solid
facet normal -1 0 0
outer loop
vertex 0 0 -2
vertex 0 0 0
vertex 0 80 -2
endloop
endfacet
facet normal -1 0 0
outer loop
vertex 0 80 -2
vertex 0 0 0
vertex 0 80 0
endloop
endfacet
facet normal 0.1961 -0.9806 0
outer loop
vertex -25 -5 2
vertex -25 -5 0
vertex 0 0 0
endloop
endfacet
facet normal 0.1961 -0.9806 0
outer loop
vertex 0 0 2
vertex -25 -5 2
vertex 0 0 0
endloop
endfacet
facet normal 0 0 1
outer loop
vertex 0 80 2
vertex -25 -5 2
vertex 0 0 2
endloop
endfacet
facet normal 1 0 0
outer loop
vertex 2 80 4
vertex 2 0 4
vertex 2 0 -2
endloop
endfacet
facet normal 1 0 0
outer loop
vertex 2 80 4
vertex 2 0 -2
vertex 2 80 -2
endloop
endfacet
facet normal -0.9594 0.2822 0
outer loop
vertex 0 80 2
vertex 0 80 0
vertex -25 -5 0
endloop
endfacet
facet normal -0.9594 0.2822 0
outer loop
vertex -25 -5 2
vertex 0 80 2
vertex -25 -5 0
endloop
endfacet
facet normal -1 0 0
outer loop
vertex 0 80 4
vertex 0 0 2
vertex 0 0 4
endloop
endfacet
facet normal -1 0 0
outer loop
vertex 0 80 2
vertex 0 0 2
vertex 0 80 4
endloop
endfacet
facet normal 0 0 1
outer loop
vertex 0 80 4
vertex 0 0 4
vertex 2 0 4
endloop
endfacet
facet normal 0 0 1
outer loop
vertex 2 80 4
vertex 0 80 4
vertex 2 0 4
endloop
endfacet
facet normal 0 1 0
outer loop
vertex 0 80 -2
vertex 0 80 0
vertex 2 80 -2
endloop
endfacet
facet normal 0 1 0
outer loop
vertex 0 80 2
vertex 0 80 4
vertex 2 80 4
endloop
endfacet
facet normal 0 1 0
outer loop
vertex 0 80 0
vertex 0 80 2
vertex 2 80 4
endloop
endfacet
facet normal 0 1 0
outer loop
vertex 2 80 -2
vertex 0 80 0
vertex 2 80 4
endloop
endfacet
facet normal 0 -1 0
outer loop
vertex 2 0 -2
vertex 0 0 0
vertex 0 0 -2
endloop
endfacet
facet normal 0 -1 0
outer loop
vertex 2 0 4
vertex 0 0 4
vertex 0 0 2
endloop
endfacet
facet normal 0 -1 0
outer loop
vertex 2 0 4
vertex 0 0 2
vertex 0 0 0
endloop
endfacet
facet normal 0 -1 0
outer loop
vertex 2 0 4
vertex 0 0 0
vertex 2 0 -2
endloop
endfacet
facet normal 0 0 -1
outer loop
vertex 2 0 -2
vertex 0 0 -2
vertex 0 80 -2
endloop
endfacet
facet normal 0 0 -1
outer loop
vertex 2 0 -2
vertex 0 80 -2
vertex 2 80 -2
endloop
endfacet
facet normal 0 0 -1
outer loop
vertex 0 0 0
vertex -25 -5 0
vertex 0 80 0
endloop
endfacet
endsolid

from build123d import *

# Parameters (mm, degrees)
F1_DEPTH  = 2
F1_FACE_W = 80
F1_FACE_H = 2
F2_DEPTH  = 2
F3_W      = 2
F3_H      = 80
F4_DEPTH  = 2
F5_DEPTH  = 4


with BuildPart() as f1:
    # F0 (on Top) → F1 (new body)
    with BuildSketch(Plane.XY):
        Polygon((-25, -5), (0, 0), (0, 80), align=None)
    extrude(amount=F1_DEPTH)

    # F1_face (on face) → F2 (join)
    with BuildSketch(Plane(origin=(0, 40, 1), x_dir=(0, 1, 0), z_dir=(1, 0, 0))):
        Rectangle(F1_FACE_W, F1_FACE_H)
    extrude(amount=F2_DEPTH)

    # F3 (on face) → F4 (join)
    with BuildSketch(Plane.XY.offset(2)):
        with Locations((1, 40)):
            Rectangle(F3_W, F3_H)
    extrude(amount=F4_DEPTH)

    # F3 (on face) → F5 (join)
    with BuildSketch(Plane.XY.offset(2)):
        with Locations((1, 40)):
            Rectangle(F3_W, F3_H)
    extrude(amount=-F5_DEPTH)


solid = f1.part
